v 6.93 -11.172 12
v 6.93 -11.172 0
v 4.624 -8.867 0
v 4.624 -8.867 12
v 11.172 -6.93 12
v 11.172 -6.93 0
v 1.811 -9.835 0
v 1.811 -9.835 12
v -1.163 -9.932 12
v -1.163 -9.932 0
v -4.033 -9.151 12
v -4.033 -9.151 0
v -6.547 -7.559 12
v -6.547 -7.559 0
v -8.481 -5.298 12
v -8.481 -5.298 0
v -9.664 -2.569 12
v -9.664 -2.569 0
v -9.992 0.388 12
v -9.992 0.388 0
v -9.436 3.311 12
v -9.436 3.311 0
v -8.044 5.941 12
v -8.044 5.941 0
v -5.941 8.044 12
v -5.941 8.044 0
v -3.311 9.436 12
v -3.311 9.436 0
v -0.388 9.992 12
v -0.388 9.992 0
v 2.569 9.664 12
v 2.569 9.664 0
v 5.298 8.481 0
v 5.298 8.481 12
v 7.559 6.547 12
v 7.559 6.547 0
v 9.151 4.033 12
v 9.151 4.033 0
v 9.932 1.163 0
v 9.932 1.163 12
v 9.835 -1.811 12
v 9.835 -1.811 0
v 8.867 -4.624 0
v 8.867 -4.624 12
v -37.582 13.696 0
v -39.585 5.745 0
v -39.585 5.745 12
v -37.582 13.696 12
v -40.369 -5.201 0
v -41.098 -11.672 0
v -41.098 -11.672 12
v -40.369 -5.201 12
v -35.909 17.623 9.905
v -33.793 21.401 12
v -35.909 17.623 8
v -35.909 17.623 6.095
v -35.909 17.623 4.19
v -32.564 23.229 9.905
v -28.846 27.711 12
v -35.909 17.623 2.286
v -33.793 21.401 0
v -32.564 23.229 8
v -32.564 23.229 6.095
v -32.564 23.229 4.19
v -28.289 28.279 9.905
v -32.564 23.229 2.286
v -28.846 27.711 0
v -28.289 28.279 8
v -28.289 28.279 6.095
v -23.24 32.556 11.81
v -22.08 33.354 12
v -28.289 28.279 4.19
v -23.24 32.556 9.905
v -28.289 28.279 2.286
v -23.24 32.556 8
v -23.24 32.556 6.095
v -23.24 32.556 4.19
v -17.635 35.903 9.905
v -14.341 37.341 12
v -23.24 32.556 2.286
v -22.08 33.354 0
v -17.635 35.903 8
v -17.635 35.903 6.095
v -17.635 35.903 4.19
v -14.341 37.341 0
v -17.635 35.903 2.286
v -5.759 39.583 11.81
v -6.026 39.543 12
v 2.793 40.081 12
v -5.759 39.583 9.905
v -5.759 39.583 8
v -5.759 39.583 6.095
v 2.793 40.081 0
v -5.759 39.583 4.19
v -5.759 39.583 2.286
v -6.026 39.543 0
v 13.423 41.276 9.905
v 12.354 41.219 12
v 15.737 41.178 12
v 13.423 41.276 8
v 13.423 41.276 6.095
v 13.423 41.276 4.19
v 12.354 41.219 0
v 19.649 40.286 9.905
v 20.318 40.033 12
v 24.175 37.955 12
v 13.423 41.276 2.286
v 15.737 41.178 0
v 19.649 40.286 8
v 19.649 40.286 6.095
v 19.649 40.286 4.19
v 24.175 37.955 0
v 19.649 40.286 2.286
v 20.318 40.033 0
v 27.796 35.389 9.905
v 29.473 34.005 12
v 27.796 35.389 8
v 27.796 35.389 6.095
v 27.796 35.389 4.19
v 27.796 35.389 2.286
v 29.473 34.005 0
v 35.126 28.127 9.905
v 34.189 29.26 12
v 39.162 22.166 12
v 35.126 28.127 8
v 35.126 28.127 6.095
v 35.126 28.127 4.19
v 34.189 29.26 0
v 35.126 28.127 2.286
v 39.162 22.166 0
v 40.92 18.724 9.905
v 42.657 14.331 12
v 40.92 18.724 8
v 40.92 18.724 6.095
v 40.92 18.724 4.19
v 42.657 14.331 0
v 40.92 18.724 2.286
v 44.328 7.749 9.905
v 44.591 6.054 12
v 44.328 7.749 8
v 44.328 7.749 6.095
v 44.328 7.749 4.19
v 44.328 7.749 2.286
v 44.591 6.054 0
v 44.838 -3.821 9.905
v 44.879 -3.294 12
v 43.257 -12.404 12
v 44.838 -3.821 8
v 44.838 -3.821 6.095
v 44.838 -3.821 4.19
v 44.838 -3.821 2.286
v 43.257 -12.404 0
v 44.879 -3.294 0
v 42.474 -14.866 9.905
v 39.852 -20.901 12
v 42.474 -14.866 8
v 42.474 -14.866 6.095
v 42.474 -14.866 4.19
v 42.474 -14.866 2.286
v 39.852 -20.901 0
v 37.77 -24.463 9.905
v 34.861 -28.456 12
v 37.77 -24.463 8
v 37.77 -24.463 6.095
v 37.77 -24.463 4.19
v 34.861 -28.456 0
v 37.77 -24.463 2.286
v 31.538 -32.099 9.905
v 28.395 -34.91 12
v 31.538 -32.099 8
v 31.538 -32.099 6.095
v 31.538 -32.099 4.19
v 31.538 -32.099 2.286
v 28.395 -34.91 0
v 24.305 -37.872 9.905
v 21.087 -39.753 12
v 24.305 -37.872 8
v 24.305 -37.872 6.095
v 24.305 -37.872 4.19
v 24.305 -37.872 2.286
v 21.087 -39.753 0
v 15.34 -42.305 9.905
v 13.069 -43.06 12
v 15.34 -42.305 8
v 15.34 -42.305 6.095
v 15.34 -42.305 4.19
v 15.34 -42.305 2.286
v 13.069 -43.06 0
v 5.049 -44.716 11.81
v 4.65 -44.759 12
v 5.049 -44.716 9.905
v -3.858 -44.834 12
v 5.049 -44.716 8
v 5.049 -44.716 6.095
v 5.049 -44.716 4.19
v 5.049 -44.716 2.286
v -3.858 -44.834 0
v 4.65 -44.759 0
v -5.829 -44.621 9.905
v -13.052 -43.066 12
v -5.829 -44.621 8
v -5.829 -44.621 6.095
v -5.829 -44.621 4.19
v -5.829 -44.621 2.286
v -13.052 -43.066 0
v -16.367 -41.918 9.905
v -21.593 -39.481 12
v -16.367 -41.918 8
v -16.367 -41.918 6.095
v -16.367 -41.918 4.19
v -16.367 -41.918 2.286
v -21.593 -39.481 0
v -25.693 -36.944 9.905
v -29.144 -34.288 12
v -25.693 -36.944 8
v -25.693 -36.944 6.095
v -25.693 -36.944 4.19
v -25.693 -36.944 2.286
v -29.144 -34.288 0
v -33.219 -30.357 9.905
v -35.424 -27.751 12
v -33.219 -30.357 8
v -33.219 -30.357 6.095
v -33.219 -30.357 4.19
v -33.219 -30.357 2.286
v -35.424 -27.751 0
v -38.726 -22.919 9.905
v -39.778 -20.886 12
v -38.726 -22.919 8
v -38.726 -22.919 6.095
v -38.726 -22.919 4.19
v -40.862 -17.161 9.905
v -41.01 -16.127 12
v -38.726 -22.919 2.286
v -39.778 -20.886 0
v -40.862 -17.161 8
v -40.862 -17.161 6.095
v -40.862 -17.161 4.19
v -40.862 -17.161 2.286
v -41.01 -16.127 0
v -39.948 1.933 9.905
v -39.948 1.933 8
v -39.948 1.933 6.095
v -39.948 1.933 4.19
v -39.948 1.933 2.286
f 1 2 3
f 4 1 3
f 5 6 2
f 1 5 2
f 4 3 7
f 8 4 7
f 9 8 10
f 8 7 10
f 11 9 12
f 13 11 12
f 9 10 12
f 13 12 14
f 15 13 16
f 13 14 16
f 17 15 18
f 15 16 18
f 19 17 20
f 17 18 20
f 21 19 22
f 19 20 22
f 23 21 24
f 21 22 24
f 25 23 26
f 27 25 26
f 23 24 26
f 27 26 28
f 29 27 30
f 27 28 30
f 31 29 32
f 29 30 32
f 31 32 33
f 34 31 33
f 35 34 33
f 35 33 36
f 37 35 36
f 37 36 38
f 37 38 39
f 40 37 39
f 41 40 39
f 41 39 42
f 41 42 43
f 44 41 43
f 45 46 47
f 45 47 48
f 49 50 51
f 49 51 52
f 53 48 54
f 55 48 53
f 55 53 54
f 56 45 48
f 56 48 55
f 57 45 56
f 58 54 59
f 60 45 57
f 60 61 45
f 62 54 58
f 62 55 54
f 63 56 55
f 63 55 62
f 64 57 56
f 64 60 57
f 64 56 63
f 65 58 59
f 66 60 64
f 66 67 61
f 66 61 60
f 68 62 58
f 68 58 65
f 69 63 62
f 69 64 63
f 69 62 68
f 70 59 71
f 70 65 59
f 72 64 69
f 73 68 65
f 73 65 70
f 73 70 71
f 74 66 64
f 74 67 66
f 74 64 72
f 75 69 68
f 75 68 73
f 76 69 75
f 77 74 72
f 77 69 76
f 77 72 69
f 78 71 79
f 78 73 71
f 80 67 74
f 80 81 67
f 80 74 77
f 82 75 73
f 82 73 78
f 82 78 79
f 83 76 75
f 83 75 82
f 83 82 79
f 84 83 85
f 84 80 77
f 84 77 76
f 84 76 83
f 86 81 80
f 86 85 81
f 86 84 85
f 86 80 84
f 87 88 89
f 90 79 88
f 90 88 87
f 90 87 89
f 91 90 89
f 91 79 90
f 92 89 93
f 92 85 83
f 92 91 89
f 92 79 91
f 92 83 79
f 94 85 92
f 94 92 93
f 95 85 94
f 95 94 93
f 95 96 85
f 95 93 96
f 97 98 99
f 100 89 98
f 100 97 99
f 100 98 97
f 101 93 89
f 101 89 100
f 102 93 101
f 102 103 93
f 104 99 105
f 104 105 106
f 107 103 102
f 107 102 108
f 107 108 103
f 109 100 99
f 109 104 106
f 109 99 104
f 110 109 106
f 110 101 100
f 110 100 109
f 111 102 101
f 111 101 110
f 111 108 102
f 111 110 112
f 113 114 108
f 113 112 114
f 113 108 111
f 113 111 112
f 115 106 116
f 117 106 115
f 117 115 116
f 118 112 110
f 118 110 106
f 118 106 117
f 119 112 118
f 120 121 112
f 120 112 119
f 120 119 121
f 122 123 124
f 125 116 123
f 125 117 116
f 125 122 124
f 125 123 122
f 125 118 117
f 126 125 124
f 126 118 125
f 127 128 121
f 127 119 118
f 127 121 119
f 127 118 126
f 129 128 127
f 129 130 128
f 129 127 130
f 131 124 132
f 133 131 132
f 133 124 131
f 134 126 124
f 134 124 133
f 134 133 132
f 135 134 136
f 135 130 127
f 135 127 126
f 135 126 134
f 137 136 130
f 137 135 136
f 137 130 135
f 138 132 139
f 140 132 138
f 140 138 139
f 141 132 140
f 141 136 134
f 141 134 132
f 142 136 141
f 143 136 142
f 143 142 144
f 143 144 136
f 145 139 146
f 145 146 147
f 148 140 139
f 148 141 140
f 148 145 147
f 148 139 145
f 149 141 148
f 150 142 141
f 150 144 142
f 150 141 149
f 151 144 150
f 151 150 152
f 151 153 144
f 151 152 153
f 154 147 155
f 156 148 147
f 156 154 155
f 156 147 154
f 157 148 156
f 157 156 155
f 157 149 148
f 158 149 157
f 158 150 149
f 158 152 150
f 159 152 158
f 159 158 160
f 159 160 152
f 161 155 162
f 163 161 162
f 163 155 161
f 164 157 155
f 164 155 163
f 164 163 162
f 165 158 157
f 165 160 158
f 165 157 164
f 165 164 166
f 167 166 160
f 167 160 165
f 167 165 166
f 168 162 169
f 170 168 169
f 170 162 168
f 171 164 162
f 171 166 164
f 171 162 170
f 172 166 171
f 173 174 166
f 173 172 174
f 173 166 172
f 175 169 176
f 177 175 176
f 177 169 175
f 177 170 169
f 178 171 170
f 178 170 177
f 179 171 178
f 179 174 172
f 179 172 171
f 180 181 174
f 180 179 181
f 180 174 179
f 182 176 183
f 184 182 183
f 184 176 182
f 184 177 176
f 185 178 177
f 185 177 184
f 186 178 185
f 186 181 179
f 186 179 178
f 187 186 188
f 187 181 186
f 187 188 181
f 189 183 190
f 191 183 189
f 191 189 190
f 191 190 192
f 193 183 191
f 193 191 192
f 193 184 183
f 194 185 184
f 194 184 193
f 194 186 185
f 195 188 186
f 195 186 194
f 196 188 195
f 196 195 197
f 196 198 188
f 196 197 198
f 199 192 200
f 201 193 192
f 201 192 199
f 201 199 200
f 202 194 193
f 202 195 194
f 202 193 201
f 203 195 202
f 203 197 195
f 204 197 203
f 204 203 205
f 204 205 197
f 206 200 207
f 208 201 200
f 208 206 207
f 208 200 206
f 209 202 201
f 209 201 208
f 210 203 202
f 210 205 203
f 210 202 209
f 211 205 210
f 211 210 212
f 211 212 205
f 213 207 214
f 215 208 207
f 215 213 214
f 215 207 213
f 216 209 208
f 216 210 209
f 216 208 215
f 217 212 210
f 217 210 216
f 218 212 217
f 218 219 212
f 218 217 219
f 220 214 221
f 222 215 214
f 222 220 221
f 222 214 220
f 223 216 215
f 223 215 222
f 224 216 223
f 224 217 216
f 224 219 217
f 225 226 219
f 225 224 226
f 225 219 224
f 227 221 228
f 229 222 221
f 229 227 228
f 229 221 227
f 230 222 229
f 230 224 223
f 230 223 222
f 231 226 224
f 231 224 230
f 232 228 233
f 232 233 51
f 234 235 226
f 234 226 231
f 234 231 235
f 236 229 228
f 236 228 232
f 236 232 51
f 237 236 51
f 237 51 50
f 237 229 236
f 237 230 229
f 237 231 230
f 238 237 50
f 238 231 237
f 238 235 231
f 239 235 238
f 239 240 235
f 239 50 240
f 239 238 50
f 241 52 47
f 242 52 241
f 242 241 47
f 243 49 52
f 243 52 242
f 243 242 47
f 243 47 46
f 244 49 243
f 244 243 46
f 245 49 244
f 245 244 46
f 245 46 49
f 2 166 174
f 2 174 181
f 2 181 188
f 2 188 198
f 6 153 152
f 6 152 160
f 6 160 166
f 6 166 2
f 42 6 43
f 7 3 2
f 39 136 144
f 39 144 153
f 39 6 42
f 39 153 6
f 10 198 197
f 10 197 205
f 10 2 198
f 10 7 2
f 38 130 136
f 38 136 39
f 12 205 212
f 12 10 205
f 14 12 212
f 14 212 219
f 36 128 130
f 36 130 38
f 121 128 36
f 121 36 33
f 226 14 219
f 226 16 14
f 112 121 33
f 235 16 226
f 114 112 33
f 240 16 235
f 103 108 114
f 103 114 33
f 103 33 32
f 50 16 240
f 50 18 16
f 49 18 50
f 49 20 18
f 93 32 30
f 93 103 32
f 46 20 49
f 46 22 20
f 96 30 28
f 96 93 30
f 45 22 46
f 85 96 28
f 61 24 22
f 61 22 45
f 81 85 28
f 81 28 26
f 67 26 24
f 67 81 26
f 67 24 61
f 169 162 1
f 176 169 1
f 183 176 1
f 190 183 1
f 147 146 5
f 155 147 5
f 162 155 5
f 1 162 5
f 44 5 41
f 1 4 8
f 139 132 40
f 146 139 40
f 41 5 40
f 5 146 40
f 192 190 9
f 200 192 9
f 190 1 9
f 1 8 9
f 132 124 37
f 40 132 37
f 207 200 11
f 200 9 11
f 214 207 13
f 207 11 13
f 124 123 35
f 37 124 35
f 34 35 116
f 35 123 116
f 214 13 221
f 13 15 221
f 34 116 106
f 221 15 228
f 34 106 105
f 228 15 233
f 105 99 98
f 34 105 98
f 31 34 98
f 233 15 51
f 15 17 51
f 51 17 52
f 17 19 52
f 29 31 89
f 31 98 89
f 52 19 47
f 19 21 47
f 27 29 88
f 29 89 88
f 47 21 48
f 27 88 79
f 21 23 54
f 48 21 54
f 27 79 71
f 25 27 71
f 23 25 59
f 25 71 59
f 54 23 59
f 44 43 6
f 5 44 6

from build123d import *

# Parameters (mm, degrees)
EXTRUDE_1_DEPTH          = 12
CUT_EXTRUDE_1_DEPTH      = 12
CUT_EXTRUDE_1_DEPTH_BACK = 12


with BuildPart() as part:
    # 草图1 → 凸台-拉伸1 (new body)
    with BuildSketch(Plane.XY):
        with BuildLine():
            add(Edge.make_bspline(
                [(-39.585218855, 5.745471971), (-36.944936745, 23.936518014), (-23.949412425, 36.936579298), (-5.759289098, 39.58321095), (-4.493034432, 39.767448825), (-1.942843962, 40.014403292), (1.90852667, 39.986323878), (4.460941379, 40.186002627), (5.733272252, 40.322085771), (5.955022815, 40.345803276), (6.423833931, 40.398300747), (7.14241504, 40.485813751), (7.892721613, 40.584291583), (8.653241562, 40.690501104), (9.424776334, 40.804477568), (10.208482371, 40.924032351), (11.001050108, 41.054818025), (11.801394045, 41.17019302), (12.6062452, 41.243766285), (13.410182975, 41.281978357), (14.212080815, 41.283213296), (15.010466504, 41.248169958), (15.803971804, 41.176986285), (16.591214196, 41.070005065), (17.370829939, 40.927569381), (18.141466772, 40.750076698), (18.901787355, 40.537963882), (19.650469901, 40.291710786), (20.386209249, 40.01183821), (20.968667488, 39.759218144), (21.30535302, 39.599993598), (21.404665407, 39.551850614), (21.525670083, 39.493192009), (21.766302004, 39.373033347), (22.12433122, 39.186326932), (22.357935356, 39.05305122), (22.474436383, 38.985891156), (22.600346623, 38.913306906), (22.85146384, 38.766918474), (23.226033937, 38.543672829), (23.474267332, 38.392445808), (23.598014818, 38.316232808), (50.618136373, 21.675211964), (54.174008838, -9.858362438), (31.538341417, -32.098800922), (8.902673996, -54.339239407), (-22.563379883, -50.228522095), (-38.725917783, -22.91949589), (-38.755045843, -22.870279675), (-38.813114317, -22.771736189), (-38.899654239, -22.623587517), (-38.956969601, -22.524604106), (-38.985532831, -22.47505795), (-39.010106366, -22.432432372), (-39.059113619, -22.347100611), (-39.130334183, -22.217784831), (-39.177258062, -22.131288716), (-39.200506712, -22.087926304), (-39.373731502, -21.764834653), (-39.650574877, -21.199700468), (-39.992621915, -20.376017136), (-40.257783821, -19.63349279), (-40.486486905, -18.877402437), (-40.679361932, -18.109737008), (-40.837361899, -17.332519034), (-40.961753286, -16.547773026), (-41.054099487, -15.757495319), (-41.116241221, -14.963625441), (-41.150273012, -14.168018898), (-41.158516391, -13.372421843), (-41.143490093, -12.578447889), (-41.107877608, -11.787557387), (-41.054492529, -11.00103945), (-40.986242095, -10.219996969), (-40.906089421, -9.445334879), (-40.817014905, -8.677751836), (-40.721977304, -7.917735488), (-40.623874999, -7.165561423), (-40.526826925, -6.43127548), (-40.463783118, -5.947589656), (-40.433671769, -5.712000374), (-40.27183029, -4.445762926), (-39.981986588, -1.908962939), (-40.014343546, 1.938013732), (-39.768576726, 4.482170808), (-39.585218855, 5.745471971)],
                knots=[0, 0, 0, 0, 0.192336429, 0.192336429, 0.192336429, 0.207768076, 0.223199723, 0.23863137, 0.23863137, 0.23863137, 0.241320903, 0.244320439, 0.247361288, 0.250447034, 0.253581132, 0.256766907, 0.260007556, 0.26326894, 0.266516144, 0.269750259, 0.272972355, 0.276183492, 0.279384713, 0.282577047, 0.285761515, 0.288939122, 0.292110868, 0.295277741, 0.298440726, 0.301600798, 0.302931689, 0.302931689, 0.302931689, 0.30455328, 0.30617487, 0.307796461, 0.307796461, 0.307796461, 0.30954902, 0.311301578, 0.313054137, 0.313054137, 0.313054137, 0.597889801, 0.597889801, 0.597889801, 0.882725466, 0.882725466, 0.882725466, 0.883415111, 0.884104756, 0.884794401, 0.884794401, 0.884794401, 0.885387716, 0.885981032, 0.886574347, 0.886574347, 0.886574347, 0.890995119, 0.894157961, 0.897325907, 0.900500017, 0.903680851, 0.906868386, 0.910061983, 0.913260364, 0.916461635, 0.919663327, 0.922862469, 0.926055684, 0.929239298, 0.932409478, 0.935562364, 0.938694227, 0.941801616, 0.944881514, 0.947931482, 0.950949795, 0.953814157, 0.953814157, 0.953814157, 0.969209438, 0.984604719, 1, 1, 1, 1], degree=3, weights=[1, 0.867630243, 0.867630243, 1, 1, 1, 1, 1, 1, 1, 1, 1, 1, 1, 1, 1, 1, 1, 1, 1, 1, 1, 1, 1, 1, 1, 1, 1, 1, 1, 1, 1, 1, 1, 1, 1, 1, 1, 1, 1, 1, 1, 0.744339275, 0.744339275, 1, 0.744339275, 0.744339275, 1, 1, 1, 1, 1, 1, 1, 1, 1, 1, 1, 1, 1, 1, 1, 1, 1, 1, 1, 1, 1, 1, 1, 1, 1, 1, 1, 1, 1, 1, 1, 1, 1, 1, 1, 1, 1, 1, 1]))
        make_face()
    extrude(amount=EXTRUDE_1_DEPTH)

    # 草图2 → 切除-拉伸1 (cut, two sides: drawn at the far end of the back side and taken through both)
    with BuildSketch(Plane.XY.offset(-CUT_EXTRUDE_1_DEPTH_BACK)):
        with BuildLine():
            Line((8.866689125, -4.624048438), (11.172287109, -6.929646422))
            Line((11.172287109, -6.929646422), (6.929646422, -11.172287109))
            Line((6.929646422, -11.172287109), (4.624048438, -8.866689125))
            ThreePointArc((4.624048438, -8.866689125), (-7.071067812, 7.071067812), (8.866689125, -4.624048438))
        make_face()
    extrude(amount=CUT_EXTRUDE_1_DEPTH + CUT_EXTRUDE_1_DEPTH_BACK, mode=Mode.SUBTRACT)


solid = part.part
